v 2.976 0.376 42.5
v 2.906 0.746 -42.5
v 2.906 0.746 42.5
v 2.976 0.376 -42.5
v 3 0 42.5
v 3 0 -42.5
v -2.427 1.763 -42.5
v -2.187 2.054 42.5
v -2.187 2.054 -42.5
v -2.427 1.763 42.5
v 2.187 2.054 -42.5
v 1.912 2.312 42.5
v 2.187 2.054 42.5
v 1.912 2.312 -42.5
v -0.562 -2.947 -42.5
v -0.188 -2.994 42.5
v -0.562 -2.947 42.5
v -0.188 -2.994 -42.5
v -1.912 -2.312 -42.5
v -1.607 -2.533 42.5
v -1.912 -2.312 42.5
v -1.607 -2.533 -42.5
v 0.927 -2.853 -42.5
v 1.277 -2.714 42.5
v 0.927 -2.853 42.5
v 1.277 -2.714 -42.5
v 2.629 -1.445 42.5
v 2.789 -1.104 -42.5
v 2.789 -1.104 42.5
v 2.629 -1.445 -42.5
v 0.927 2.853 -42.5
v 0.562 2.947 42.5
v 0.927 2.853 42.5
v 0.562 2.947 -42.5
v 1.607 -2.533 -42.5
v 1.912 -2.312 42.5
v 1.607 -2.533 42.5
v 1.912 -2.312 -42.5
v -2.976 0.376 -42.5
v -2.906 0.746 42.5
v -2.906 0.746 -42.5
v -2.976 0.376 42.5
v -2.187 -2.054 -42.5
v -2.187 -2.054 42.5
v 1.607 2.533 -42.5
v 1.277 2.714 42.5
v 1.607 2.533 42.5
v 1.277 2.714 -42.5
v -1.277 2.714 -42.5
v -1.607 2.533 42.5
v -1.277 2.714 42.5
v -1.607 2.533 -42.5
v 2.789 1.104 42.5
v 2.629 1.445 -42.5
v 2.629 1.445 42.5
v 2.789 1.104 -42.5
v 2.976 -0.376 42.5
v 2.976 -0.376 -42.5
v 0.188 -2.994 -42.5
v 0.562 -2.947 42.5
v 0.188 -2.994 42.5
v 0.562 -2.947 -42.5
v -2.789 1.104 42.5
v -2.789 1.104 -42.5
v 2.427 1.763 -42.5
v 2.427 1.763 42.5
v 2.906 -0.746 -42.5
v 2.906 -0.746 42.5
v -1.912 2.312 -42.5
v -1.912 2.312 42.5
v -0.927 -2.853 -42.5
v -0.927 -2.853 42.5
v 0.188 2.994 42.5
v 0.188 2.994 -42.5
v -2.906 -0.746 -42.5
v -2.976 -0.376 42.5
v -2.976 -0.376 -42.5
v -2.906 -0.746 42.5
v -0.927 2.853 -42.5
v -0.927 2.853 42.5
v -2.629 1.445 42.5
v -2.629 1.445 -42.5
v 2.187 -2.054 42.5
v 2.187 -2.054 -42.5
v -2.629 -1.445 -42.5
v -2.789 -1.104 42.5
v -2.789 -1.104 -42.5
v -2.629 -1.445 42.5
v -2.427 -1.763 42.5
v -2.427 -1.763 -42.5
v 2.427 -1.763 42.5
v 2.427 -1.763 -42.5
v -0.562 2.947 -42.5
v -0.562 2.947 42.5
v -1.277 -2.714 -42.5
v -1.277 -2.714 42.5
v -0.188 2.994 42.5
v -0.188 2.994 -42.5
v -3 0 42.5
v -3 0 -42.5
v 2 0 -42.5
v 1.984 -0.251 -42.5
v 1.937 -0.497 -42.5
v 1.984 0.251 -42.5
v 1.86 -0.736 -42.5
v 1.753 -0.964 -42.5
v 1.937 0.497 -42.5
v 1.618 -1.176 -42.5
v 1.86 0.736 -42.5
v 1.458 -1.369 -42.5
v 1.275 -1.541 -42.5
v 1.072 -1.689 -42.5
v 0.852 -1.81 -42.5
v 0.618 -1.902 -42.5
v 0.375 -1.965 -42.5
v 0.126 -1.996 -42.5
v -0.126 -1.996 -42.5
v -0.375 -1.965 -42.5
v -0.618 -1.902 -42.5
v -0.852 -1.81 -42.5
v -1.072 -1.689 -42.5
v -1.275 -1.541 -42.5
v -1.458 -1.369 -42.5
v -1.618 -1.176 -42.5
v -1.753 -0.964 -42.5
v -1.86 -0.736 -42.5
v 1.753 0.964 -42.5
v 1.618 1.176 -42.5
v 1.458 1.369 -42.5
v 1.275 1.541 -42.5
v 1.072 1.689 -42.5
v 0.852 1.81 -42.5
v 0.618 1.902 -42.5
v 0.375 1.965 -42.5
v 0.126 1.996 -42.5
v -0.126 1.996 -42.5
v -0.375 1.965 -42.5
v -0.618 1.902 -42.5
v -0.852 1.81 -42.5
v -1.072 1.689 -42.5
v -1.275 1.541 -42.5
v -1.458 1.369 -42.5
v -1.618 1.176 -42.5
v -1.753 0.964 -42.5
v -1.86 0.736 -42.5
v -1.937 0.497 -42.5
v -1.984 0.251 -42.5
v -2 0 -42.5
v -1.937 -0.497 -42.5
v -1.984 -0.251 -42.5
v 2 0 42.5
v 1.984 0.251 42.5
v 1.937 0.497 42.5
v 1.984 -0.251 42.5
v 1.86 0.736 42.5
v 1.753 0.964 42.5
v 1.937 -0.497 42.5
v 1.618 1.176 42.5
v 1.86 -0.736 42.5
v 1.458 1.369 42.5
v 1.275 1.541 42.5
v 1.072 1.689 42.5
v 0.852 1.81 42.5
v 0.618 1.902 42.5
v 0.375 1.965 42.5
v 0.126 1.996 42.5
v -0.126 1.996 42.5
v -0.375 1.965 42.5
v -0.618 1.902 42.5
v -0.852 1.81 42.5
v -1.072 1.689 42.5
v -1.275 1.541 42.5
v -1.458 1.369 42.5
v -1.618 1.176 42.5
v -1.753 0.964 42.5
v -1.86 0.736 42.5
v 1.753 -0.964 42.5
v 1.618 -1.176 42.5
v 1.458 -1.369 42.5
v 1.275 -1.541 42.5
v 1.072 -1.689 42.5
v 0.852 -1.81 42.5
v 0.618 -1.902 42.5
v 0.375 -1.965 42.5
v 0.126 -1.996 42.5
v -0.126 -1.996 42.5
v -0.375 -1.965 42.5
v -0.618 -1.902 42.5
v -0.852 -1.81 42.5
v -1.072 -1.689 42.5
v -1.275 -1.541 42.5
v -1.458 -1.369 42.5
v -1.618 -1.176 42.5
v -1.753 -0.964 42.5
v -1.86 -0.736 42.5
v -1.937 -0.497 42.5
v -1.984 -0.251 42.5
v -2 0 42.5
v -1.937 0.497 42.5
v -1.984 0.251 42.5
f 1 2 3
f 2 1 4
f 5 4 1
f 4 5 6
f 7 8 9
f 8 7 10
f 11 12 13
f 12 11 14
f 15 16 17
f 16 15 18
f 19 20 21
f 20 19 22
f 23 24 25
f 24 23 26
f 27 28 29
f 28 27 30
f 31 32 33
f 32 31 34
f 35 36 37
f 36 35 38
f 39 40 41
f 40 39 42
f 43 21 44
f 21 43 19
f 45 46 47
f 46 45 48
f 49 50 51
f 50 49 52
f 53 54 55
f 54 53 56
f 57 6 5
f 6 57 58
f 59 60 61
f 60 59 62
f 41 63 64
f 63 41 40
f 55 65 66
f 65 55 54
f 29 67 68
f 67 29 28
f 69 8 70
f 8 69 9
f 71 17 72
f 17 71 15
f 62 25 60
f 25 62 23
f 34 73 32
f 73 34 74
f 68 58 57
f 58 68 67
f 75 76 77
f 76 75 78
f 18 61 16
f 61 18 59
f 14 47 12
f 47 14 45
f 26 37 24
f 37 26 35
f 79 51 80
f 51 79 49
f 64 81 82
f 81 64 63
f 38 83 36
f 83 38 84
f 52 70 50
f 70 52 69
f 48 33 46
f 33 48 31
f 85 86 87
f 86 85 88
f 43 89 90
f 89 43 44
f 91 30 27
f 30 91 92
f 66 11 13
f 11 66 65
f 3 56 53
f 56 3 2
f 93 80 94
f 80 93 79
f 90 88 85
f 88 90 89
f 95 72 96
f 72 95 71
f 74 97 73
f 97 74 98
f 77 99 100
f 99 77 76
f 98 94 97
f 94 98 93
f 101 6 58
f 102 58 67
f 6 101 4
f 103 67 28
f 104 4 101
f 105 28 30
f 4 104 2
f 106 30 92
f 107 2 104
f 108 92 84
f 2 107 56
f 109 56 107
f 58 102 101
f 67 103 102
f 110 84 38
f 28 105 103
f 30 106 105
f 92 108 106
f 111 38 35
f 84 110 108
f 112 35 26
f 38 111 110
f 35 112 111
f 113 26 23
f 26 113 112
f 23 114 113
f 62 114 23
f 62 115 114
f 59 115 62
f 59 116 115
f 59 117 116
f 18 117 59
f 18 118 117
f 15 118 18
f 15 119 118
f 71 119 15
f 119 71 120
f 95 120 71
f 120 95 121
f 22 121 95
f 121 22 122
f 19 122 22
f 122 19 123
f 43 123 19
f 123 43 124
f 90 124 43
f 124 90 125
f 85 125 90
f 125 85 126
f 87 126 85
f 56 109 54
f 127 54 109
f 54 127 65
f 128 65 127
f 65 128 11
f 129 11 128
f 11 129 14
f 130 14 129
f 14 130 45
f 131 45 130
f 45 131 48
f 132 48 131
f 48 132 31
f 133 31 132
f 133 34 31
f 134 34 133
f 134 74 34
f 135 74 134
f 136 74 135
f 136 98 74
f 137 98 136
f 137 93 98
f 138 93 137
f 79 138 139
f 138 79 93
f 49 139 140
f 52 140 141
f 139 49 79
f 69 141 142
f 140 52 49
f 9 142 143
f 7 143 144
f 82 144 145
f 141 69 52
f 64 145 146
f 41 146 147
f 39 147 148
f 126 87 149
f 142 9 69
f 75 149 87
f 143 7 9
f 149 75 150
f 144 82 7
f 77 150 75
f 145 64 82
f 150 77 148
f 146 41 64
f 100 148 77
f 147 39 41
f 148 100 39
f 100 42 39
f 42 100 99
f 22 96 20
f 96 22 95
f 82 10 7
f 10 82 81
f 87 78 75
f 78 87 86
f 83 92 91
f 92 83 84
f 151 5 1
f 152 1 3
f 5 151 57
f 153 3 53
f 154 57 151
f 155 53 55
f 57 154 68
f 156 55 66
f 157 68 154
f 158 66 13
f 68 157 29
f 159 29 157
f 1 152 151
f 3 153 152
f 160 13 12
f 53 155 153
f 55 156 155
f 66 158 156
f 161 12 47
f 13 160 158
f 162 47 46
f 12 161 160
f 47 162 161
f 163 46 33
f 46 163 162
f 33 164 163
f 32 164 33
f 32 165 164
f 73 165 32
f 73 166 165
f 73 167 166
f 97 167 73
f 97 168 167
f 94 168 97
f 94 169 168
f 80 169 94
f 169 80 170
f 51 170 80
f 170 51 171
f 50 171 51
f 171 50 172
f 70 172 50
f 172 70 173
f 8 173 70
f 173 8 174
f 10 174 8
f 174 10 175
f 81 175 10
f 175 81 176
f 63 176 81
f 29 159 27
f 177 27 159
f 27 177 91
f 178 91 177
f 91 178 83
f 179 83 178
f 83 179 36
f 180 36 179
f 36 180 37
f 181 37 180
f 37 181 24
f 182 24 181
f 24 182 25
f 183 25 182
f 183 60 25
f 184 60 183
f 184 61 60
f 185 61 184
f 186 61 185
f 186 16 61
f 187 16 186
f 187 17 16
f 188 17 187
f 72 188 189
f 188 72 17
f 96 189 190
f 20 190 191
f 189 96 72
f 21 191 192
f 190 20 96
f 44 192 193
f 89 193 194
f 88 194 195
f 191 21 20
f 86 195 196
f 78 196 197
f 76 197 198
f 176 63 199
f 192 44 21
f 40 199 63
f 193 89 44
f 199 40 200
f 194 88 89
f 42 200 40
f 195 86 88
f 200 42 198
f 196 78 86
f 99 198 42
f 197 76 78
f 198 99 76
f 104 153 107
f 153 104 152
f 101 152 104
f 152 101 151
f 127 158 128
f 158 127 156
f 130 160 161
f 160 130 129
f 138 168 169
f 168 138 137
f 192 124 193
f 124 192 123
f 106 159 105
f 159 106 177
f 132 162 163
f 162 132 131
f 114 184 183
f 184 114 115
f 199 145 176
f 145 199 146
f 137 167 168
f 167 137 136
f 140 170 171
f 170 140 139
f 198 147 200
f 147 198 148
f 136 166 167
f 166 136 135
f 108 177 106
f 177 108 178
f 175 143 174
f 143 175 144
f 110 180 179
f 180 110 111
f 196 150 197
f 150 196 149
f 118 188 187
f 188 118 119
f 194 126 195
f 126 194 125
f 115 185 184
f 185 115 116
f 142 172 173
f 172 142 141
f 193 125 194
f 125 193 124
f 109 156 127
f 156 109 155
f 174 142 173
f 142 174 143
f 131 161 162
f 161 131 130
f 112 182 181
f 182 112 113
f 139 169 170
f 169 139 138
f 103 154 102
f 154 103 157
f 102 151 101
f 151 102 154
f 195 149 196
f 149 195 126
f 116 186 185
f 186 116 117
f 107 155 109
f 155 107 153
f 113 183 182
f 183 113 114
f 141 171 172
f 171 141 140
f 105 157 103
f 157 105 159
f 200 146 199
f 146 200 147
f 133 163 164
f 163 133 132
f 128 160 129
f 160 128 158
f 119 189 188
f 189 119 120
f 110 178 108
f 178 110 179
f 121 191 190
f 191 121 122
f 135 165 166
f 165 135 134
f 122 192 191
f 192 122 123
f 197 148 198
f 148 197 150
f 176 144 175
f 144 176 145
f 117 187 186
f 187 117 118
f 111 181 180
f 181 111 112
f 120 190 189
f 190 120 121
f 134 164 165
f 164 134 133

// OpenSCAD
$fn = 50;


difference() {
	union() {
		translate(v = [0, 0, -42.5000000000]) {
			cylinder(h = 85, r = 3.0000000000);
		}
	}
	union() {
		translate(v = [0, 0, -100.0000000000]) {
			cylinder(h = 200, r = 2.0000000000);
		}
	}
}
